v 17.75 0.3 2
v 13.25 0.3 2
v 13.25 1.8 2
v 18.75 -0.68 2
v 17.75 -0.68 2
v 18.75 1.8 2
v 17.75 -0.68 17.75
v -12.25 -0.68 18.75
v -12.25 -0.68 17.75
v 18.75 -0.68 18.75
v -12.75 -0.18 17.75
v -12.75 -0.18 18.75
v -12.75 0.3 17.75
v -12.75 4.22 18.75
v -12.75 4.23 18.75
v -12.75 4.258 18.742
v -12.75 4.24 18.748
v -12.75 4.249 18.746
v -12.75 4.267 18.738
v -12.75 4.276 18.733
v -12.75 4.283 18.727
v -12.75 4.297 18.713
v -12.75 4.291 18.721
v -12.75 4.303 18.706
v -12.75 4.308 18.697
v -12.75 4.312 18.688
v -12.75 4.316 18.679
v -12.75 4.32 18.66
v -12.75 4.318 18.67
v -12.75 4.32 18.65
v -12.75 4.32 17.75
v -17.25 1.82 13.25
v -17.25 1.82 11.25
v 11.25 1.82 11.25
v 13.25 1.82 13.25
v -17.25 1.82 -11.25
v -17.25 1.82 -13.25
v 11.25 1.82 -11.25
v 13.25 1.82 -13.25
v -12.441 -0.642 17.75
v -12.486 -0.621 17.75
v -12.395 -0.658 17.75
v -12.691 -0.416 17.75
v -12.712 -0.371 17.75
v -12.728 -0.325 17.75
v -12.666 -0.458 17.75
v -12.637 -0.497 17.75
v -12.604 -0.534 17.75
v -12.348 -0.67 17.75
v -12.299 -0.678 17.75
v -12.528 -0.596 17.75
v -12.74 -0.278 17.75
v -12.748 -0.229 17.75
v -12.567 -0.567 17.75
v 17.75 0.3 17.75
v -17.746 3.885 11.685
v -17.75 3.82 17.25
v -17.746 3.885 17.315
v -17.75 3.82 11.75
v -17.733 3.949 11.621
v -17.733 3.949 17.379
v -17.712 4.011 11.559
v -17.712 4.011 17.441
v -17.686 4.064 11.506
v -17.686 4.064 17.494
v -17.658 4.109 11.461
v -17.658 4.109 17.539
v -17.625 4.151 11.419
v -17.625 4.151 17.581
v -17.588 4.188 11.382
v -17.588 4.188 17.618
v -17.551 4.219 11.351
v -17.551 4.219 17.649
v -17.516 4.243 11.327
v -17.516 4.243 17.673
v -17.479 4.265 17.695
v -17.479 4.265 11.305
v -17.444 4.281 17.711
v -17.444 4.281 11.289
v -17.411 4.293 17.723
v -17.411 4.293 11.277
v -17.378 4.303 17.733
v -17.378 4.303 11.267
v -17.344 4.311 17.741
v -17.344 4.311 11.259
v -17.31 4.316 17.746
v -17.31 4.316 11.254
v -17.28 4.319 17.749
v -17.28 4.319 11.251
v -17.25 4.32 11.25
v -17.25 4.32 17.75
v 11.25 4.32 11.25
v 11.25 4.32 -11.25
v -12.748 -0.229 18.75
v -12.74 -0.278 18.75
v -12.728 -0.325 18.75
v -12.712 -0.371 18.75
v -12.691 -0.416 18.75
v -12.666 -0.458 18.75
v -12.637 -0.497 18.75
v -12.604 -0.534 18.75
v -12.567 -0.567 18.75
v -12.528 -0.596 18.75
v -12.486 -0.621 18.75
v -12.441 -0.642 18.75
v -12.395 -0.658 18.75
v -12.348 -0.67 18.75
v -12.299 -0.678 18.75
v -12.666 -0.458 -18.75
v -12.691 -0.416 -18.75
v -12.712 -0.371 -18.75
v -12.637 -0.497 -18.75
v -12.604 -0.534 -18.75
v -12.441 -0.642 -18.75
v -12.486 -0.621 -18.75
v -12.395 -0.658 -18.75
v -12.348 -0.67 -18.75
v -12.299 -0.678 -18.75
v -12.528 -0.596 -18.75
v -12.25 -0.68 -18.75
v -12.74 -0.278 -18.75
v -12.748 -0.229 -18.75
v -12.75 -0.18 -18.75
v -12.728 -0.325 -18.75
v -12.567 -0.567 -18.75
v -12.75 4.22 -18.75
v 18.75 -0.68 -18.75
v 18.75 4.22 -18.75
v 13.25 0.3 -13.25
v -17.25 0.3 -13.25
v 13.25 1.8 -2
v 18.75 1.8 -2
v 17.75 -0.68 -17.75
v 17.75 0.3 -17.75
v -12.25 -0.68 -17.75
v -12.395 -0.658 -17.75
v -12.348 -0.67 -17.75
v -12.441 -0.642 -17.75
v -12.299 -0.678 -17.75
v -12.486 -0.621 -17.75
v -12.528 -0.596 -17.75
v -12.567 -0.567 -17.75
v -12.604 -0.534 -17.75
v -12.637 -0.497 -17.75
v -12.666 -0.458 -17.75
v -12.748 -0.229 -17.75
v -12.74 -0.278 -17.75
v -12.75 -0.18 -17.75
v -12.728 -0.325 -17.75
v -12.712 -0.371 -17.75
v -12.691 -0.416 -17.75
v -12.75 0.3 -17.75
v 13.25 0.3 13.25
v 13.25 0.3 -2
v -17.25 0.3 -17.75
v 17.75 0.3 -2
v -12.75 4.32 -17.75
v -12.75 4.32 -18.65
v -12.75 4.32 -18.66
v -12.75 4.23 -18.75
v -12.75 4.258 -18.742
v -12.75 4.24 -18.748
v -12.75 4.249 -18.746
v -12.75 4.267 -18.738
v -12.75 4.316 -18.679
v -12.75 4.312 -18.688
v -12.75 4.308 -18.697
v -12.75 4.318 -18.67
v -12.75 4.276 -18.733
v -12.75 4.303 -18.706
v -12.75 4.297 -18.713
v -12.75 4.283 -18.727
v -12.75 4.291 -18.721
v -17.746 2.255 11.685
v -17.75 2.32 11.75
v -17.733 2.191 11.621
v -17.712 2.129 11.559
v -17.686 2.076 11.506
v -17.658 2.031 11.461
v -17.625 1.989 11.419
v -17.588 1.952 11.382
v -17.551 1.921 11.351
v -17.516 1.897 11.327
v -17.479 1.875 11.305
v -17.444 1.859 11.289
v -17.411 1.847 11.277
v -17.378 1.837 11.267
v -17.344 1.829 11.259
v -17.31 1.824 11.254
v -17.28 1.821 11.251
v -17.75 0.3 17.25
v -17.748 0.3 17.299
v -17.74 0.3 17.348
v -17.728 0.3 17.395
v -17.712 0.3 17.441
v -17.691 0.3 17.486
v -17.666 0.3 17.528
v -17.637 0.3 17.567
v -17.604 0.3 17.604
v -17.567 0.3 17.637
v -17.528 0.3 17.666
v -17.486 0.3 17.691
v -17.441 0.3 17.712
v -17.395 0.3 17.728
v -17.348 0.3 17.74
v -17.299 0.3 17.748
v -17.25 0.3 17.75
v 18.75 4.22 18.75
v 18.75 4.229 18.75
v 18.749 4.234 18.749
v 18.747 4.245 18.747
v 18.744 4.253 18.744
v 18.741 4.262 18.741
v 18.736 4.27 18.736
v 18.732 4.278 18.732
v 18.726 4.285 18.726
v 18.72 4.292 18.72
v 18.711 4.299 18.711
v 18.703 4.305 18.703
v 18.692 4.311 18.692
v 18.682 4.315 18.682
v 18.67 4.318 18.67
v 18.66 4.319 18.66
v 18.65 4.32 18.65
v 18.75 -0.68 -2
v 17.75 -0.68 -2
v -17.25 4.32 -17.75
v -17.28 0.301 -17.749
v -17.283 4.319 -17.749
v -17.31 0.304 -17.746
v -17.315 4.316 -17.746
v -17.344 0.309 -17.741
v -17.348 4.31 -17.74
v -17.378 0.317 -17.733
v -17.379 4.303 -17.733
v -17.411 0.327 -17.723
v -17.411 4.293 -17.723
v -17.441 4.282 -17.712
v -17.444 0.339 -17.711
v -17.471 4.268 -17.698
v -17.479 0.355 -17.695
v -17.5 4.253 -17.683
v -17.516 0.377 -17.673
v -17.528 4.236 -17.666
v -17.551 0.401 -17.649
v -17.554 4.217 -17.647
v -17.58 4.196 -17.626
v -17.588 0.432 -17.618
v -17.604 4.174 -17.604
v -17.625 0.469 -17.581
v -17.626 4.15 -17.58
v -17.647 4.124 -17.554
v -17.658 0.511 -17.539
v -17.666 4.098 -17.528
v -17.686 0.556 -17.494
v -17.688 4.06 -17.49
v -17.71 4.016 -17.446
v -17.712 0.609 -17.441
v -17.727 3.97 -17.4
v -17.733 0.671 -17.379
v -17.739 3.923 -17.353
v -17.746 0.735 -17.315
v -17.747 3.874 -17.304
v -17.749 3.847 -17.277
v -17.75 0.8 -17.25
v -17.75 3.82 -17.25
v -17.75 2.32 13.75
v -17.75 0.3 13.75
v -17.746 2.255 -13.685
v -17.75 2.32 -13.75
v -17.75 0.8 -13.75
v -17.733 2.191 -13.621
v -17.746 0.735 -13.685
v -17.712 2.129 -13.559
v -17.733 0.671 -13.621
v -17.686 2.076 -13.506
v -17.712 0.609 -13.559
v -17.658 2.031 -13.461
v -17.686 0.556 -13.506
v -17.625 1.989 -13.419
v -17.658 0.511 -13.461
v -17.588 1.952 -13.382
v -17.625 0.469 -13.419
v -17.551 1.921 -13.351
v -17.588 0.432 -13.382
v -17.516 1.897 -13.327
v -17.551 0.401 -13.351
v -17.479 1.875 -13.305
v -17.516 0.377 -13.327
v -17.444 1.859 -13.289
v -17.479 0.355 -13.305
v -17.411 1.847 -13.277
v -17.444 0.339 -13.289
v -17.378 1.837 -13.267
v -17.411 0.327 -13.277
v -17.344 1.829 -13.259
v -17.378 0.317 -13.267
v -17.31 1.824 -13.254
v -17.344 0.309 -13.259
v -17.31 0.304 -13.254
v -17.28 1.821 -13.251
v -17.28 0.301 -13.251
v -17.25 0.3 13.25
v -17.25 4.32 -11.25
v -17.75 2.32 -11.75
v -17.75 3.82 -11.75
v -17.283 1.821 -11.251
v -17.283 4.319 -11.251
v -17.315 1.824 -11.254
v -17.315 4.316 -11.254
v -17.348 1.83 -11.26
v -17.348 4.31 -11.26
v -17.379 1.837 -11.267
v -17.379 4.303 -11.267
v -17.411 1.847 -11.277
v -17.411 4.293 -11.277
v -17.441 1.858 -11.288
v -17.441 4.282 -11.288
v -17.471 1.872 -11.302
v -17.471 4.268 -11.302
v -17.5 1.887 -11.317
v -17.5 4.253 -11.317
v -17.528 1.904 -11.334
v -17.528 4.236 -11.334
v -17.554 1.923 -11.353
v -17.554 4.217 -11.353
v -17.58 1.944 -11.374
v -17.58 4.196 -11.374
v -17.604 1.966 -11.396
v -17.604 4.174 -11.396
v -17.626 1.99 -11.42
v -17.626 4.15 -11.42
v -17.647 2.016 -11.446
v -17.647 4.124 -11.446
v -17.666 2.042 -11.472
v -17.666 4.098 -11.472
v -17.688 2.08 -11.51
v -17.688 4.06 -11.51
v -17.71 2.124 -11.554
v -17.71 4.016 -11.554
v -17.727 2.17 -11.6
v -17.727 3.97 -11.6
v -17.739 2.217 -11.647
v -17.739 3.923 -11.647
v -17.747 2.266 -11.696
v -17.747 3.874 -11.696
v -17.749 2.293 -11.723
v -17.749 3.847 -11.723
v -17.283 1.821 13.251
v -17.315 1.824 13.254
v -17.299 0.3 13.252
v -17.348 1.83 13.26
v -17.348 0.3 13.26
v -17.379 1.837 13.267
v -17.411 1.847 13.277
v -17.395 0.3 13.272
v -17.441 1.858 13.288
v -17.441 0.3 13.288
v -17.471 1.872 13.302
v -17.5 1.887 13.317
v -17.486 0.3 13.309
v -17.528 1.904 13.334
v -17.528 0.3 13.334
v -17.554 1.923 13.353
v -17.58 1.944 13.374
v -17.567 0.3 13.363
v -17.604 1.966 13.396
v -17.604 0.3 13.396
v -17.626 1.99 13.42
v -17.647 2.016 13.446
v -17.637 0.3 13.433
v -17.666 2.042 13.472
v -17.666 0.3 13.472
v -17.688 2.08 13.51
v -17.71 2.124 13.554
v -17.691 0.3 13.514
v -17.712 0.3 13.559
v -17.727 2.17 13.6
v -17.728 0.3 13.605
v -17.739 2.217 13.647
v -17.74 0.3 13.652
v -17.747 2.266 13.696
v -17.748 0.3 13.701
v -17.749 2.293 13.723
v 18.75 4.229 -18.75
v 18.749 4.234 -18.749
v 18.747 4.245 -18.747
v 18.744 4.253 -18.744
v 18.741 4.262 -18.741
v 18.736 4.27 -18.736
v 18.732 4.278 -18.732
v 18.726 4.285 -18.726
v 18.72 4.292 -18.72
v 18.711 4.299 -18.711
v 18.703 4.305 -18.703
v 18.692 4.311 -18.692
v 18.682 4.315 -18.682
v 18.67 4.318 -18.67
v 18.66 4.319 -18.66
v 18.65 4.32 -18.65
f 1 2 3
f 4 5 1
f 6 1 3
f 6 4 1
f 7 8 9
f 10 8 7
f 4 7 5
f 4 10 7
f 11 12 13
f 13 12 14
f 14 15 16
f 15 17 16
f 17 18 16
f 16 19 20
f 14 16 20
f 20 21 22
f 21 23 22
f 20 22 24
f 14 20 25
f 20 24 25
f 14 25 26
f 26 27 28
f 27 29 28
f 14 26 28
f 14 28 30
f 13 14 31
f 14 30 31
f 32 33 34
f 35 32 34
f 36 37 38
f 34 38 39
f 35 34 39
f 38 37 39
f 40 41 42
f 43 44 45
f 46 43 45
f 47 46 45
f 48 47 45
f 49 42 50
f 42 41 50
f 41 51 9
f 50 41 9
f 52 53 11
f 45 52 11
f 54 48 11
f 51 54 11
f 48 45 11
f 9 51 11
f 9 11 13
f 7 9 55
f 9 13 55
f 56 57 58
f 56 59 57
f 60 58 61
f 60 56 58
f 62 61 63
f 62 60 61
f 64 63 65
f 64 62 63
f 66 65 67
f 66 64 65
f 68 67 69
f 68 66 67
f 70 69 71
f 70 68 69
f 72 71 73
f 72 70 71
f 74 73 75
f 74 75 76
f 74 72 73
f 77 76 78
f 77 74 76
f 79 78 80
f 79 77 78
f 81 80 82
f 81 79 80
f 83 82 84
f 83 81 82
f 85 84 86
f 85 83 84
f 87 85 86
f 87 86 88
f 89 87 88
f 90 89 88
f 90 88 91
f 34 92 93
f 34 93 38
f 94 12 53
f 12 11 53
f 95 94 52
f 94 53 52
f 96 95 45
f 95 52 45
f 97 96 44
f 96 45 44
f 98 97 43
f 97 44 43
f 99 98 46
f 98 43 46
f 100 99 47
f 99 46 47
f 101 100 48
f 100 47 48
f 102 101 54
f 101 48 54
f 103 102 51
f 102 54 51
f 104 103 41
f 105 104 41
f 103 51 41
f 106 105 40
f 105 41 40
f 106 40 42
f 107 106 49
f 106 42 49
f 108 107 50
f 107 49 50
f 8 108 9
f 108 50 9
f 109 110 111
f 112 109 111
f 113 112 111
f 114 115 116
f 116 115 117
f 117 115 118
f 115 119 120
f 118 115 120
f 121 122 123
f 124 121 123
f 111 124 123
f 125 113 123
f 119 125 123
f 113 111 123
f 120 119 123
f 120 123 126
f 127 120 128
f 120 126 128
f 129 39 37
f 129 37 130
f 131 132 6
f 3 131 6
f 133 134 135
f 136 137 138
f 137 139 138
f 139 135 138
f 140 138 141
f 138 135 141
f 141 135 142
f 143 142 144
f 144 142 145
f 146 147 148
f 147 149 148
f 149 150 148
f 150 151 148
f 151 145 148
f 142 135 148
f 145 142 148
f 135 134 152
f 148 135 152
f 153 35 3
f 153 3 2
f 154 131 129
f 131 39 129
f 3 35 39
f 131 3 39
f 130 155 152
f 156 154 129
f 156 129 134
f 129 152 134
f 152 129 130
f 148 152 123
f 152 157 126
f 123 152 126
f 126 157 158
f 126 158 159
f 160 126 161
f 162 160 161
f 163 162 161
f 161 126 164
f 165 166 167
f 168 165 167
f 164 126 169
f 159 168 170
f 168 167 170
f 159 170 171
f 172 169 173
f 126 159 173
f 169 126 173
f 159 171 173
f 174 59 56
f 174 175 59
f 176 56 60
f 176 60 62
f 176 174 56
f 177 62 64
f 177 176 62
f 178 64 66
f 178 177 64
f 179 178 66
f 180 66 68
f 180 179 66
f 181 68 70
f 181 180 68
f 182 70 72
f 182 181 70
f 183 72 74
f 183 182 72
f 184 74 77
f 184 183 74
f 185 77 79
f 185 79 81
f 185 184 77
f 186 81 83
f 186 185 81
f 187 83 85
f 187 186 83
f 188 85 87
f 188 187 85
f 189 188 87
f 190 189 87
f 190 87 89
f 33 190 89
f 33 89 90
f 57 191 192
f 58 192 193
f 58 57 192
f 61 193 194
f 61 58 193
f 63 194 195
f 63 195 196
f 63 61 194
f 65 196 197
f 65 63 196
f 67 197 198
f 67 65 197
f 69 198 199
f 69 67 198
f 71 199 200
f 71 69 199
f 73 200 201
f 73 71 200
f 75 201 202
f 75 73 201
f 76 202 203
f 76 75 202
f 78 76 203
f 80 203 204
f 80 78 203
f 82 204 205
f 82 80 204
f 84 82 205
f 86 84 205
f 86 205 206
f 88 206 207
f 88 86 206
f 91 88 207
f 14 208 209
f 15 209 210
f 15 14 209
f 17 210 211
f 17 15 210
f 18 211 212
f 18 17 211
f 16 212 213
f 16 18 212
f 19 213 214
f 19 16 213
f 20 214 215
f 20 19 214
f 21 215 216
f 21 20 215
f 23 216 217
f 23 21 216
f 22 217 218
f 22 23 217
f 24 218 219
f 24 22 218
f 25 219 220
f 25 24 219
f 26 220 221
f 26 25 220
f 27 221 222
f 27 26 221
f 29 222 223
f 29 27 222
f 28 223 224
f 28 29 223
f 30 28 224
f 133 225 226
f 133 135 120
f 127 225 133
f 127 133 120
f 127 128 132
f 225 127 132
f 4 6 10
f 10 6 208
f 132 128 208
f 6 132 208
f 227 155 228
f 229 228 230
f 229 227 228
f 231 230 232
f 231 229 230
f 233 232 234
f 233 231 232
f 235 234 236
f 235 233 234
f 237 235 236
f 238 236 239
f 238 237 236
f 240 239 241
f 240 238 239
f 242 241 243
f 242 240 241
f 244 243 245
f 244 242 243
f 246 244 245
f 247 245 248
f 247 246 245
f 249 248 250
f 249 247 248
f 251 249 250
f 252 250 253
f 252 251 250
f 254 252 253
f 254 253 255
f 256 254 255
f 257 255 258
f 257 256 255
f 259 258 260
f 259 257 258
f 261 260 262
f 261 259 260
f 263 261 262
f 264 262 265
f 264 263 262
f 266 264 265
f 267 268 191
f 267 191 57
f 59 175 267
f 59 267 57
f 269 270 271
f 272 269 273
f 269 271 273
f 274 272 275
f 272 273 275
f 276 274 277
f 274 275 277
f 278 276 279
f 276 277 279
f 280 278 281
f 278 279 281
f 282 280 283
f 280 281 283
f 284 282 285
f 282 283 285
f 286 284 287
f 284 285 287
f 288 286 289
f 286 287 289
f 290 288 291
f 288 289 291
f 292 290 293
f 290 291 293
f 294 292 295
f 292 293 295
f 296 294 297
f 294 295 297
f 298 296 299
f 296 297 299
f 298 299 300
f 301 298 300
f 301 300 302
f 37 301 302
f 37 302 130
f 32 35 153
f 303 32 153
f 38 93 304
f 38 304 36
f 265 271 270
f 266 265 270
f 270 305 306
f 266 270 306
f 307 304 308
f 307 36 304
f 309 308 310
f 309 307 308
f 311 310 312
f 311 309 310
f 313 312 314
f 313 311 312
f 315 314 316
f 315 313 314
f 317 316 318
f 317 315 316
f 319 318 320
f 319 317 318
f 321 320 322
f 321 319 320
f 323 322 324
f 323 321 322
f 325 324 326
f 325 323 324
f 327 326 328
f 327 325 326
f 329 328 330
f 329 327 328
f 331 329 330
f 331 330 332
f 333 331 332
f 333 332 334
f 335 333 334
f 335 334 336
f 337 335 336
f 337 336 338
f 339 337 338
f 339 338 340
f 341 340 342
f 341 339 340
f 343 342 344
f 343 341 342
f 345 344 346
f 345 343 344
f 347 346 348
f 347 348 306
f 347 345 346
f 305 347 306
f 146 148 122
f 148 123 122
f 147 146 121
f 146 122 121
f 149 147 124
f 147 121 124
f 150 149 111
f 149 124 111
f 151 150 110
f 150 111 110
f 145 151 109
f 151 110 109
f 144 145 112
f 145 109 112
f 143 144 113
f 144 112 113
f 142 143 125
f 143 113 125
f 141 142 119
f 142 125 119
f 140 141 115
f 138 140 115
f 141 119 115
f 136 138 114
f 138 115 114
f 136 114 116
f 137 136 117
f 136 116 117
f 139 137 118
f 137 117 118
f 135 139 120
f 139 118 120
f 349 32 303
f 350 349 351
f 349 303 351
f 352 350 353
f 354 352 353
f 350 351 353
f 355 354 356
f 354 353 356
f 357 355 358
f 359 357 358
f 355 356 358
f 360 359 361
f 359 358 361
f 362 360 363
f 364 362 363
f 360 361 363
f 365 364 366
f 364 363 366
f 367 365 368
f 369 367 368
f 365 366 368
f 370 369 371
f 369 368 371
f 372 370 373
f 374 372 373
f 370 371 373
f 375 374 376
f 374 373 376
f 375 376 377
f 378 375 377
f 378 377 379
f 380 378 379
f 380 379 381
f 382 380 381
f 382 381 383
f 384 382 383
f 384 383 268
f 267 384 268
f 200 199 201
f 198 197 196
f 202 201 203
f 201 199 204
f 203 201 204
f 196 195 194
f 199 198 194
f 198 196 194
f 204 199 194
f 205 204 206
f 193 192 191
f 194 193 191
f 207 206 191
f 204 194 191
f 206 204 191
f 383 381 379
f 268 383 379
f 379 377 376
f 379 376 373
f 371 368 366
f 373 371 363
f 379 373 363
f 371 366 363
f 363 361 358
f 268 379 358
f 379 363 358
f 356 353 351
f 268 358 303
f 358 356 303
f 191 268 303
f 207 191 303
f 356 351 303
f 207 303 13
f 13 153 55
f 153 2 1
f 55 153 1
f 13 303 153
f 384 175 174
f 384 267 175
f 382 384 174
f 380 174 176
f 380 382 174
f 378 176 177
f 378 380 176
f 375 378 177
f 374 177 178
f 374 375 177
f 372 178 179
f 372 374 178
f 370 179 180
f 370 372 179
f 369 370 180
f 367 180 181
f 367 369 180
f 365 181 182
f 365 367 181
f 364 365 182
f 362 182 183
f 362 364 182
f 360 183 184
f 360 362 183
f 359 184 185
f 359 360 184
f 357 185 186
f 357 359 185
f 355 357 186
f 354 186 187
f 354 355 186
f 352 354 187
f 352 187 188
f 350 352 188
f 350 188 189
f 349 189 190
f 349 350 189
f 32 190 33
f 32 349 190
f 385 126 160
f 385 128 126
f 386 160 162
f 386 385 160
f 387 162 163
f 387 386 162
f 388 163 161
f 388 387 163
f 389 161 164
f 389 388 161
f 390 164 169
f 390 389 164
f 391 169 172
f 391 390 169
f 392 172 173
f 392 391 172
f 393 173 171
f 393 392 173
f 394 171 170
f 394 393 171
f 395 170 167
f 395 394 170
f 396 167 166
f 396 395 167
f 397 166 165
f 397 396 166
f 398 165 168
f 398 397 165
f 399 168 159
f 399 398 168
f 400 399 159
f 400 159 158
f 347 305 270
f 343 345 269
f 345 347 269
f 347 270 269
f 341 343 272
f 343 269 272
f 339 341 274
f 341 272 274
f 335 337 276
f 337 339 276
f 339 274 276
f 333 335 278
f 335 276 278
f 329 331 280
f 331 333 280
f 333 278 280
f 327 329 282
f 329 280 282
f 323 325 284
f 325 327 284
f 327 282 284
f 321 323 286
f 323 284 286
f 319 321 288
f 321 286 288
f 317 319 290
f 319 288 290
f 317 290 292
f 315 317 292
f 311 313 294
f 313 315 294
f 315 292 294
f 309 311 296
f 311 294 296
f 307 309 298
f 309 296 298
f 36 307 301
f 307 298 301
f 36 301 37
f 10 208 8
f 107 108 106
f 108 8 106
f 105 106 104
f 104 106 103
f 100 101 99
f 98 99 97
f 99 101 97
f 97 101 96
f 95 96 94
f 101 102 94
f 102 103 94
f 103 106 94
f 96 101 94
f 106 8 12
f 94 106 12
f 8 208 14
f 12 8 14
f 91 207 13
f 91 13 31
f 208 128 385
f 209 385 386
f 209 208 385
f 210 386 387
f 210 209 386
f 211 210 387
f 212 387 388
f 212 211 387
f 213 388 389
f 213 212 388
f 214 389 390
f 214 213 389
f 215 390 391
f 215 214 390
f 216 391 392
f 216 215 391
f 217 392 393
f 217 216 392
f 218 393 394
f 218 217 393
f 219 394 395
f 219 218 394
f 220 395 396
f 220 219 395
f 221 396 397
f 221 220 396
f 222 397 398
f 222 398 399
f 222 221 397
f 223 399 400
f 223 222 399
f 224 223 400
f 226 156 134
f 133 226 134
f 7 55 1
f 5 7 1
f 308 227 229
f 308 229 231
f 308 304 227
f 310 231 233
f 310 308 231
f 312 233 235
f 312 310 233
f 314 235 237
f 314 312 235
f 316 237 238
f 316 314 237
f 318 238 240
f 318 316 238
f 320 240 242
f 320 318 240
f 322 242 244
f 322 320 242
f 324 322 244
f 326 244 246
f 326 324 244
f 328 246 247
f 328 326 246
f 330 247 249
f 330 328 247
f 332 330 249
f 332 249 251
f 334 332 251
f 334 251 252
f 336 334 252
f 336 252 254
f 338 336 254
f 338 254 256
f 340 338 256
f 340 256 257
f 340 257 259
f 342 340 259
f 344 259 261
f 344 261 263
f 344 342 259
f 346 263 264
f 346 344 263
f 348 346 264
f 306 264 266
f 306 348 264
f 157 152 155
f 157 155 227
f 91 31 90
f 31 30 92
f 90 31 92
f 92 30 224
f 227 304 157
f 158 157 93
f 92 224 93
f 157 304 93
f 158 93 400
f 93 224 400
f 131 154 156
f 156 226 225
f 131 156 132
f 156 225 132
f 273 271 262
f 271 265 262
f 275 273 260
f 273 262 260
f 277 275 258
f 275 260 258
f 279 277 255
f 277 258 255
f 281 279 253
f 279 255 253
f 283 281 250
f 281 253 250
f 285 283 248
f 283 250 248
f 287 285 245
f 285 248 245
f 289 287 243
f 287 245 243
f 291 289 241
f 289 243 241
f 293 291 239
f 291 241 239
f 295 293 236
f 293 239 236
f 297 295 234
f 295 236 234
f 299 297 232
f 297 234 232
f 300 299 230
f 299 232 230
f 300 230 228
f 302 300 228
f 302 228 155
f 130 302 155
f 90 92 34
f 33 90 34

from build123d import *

# Parameters (mm, degrees)
PAD002_DEPTH       = 17.75
PAD002_DEPTH_BACK  = 17.75
POLARPATTERN_COUNT = 2
POLARPATTERN_ANGLE = 270
FILLET_R           = 0.5
PAD005_DEPTH       = 5
FILLET005_R        = 0.1
FILLET006_R        = 0.5
FILLET007_R        = 0.5
SKETCH009_W        = 2.5
SKETCH009_H        = 4
POCKET001_DEPTH    = 36.501


with BuildPart() as part:
    # Sketch003 → Pad002 (new body, two sides)
    with BuildSketch(Plane.YZ) as pad002_sk:
        Polygon((0, -17.75), (4.02, -17.75), (4.02, -11.25), (1.52, -11.25), (1.52, -13.25), (0, -13.25), align=None)
    pad002 = extrude(amount=PAD002_DEPTH) + extrude(pad002_sk.sketch, amount=-PAD002_DEPTH_BACK)

    # PolarPattern: Pad002 ×2 about axis
    polarpattern_axis = Axis((0, 0, 0), (0, 1, 0))
    for i in range(1, POLARPATTERN_COUNT):
        add(pad002.rotate(polarpattern_axis, i * POLARPATTERN_ANGLE / (POLARPATTERN_COUNT - 1)))

    # Mirrored: Pad002 across Sketch003 H_Axis
    add(pad002.mirror(Plane.XY))

    # Fillet
    fillet_edges = [part.edges().sort_by_distance(p)[0] for p in [
        (-17.75, 4.02, 14.5),
        (-17.75, 2.77, 11.25),
        (-17.75, 0.76, 13.25),
        (-17.75, 1.52, 12.25),
        (-17.75, 2.01, 17.75),
    ]]
    fillet(fillet_edges, radius=FILLET_R)

    # Sketch008 → Pad005 (join)
    with BuildSketch(Plane.ZX.offset(4.02)):
        Polygon((-18.75, 18.75), (18.75, 18.75), (18.75, -12.75), (17.75, -12.75), (17.75, 17.75), (-17.75, 17.75), (-17.75, -12.75), (-18.75, -12.75), align=None)
    extrude(amount=-PAD005_DEPTH)

    # Fillet005
    fillet005_edges = [part.edges().sort_by_distance(p)[0] for p in [
        (18.75, 4.02, 0),
        (3, 4.02, -18.75),
        (3, 4.02, 18.75),
    ]]
    fillet(fillet005_edges, radius=FILLET005_R)

    # Fillet006
    fillet006_edges = [part.edges().sort_by_distance(p)[0] for p in [
        (-17.75, 2.77, -11.25),
        (-17.75, 1.52, -12.25),
        (-17.75, 0, -15.5),
        (-17.75, 0.76, -13.25),
        (-17.75, 4.02, -14.5),
        (-17.75, 2.01, -17.75),
    ]]
    fillet(fillet006_edges, radius=FILLET006_R)

    # Fillet007
    fillet007_edges = [part.edges().sort_by_distance(p)[0] for p in [
        (-12.75, -0.98, 18.25),
        (-12.75, -0.98, -18.25),
    ]]
    fillet(fillet007_edges, radius=FILLET007_R)

    # Sketch009 → Pocket001 (cut, through all)
    with BuildSketch(Plane.YZ.offset(18.75)):
        with Locations((0.25, 0)):
            Rectangle(SKETCH009_W, SKETCH009_H)
    extrude(amount=-POCKET001_DEPTH, mode=Mode.SUBTRACT)


with BuildPart() as part_1:
    # Body001 placement: moved
    add(part.part.moved(Location((0, 0.3, 0))))


solid = part_1.part
